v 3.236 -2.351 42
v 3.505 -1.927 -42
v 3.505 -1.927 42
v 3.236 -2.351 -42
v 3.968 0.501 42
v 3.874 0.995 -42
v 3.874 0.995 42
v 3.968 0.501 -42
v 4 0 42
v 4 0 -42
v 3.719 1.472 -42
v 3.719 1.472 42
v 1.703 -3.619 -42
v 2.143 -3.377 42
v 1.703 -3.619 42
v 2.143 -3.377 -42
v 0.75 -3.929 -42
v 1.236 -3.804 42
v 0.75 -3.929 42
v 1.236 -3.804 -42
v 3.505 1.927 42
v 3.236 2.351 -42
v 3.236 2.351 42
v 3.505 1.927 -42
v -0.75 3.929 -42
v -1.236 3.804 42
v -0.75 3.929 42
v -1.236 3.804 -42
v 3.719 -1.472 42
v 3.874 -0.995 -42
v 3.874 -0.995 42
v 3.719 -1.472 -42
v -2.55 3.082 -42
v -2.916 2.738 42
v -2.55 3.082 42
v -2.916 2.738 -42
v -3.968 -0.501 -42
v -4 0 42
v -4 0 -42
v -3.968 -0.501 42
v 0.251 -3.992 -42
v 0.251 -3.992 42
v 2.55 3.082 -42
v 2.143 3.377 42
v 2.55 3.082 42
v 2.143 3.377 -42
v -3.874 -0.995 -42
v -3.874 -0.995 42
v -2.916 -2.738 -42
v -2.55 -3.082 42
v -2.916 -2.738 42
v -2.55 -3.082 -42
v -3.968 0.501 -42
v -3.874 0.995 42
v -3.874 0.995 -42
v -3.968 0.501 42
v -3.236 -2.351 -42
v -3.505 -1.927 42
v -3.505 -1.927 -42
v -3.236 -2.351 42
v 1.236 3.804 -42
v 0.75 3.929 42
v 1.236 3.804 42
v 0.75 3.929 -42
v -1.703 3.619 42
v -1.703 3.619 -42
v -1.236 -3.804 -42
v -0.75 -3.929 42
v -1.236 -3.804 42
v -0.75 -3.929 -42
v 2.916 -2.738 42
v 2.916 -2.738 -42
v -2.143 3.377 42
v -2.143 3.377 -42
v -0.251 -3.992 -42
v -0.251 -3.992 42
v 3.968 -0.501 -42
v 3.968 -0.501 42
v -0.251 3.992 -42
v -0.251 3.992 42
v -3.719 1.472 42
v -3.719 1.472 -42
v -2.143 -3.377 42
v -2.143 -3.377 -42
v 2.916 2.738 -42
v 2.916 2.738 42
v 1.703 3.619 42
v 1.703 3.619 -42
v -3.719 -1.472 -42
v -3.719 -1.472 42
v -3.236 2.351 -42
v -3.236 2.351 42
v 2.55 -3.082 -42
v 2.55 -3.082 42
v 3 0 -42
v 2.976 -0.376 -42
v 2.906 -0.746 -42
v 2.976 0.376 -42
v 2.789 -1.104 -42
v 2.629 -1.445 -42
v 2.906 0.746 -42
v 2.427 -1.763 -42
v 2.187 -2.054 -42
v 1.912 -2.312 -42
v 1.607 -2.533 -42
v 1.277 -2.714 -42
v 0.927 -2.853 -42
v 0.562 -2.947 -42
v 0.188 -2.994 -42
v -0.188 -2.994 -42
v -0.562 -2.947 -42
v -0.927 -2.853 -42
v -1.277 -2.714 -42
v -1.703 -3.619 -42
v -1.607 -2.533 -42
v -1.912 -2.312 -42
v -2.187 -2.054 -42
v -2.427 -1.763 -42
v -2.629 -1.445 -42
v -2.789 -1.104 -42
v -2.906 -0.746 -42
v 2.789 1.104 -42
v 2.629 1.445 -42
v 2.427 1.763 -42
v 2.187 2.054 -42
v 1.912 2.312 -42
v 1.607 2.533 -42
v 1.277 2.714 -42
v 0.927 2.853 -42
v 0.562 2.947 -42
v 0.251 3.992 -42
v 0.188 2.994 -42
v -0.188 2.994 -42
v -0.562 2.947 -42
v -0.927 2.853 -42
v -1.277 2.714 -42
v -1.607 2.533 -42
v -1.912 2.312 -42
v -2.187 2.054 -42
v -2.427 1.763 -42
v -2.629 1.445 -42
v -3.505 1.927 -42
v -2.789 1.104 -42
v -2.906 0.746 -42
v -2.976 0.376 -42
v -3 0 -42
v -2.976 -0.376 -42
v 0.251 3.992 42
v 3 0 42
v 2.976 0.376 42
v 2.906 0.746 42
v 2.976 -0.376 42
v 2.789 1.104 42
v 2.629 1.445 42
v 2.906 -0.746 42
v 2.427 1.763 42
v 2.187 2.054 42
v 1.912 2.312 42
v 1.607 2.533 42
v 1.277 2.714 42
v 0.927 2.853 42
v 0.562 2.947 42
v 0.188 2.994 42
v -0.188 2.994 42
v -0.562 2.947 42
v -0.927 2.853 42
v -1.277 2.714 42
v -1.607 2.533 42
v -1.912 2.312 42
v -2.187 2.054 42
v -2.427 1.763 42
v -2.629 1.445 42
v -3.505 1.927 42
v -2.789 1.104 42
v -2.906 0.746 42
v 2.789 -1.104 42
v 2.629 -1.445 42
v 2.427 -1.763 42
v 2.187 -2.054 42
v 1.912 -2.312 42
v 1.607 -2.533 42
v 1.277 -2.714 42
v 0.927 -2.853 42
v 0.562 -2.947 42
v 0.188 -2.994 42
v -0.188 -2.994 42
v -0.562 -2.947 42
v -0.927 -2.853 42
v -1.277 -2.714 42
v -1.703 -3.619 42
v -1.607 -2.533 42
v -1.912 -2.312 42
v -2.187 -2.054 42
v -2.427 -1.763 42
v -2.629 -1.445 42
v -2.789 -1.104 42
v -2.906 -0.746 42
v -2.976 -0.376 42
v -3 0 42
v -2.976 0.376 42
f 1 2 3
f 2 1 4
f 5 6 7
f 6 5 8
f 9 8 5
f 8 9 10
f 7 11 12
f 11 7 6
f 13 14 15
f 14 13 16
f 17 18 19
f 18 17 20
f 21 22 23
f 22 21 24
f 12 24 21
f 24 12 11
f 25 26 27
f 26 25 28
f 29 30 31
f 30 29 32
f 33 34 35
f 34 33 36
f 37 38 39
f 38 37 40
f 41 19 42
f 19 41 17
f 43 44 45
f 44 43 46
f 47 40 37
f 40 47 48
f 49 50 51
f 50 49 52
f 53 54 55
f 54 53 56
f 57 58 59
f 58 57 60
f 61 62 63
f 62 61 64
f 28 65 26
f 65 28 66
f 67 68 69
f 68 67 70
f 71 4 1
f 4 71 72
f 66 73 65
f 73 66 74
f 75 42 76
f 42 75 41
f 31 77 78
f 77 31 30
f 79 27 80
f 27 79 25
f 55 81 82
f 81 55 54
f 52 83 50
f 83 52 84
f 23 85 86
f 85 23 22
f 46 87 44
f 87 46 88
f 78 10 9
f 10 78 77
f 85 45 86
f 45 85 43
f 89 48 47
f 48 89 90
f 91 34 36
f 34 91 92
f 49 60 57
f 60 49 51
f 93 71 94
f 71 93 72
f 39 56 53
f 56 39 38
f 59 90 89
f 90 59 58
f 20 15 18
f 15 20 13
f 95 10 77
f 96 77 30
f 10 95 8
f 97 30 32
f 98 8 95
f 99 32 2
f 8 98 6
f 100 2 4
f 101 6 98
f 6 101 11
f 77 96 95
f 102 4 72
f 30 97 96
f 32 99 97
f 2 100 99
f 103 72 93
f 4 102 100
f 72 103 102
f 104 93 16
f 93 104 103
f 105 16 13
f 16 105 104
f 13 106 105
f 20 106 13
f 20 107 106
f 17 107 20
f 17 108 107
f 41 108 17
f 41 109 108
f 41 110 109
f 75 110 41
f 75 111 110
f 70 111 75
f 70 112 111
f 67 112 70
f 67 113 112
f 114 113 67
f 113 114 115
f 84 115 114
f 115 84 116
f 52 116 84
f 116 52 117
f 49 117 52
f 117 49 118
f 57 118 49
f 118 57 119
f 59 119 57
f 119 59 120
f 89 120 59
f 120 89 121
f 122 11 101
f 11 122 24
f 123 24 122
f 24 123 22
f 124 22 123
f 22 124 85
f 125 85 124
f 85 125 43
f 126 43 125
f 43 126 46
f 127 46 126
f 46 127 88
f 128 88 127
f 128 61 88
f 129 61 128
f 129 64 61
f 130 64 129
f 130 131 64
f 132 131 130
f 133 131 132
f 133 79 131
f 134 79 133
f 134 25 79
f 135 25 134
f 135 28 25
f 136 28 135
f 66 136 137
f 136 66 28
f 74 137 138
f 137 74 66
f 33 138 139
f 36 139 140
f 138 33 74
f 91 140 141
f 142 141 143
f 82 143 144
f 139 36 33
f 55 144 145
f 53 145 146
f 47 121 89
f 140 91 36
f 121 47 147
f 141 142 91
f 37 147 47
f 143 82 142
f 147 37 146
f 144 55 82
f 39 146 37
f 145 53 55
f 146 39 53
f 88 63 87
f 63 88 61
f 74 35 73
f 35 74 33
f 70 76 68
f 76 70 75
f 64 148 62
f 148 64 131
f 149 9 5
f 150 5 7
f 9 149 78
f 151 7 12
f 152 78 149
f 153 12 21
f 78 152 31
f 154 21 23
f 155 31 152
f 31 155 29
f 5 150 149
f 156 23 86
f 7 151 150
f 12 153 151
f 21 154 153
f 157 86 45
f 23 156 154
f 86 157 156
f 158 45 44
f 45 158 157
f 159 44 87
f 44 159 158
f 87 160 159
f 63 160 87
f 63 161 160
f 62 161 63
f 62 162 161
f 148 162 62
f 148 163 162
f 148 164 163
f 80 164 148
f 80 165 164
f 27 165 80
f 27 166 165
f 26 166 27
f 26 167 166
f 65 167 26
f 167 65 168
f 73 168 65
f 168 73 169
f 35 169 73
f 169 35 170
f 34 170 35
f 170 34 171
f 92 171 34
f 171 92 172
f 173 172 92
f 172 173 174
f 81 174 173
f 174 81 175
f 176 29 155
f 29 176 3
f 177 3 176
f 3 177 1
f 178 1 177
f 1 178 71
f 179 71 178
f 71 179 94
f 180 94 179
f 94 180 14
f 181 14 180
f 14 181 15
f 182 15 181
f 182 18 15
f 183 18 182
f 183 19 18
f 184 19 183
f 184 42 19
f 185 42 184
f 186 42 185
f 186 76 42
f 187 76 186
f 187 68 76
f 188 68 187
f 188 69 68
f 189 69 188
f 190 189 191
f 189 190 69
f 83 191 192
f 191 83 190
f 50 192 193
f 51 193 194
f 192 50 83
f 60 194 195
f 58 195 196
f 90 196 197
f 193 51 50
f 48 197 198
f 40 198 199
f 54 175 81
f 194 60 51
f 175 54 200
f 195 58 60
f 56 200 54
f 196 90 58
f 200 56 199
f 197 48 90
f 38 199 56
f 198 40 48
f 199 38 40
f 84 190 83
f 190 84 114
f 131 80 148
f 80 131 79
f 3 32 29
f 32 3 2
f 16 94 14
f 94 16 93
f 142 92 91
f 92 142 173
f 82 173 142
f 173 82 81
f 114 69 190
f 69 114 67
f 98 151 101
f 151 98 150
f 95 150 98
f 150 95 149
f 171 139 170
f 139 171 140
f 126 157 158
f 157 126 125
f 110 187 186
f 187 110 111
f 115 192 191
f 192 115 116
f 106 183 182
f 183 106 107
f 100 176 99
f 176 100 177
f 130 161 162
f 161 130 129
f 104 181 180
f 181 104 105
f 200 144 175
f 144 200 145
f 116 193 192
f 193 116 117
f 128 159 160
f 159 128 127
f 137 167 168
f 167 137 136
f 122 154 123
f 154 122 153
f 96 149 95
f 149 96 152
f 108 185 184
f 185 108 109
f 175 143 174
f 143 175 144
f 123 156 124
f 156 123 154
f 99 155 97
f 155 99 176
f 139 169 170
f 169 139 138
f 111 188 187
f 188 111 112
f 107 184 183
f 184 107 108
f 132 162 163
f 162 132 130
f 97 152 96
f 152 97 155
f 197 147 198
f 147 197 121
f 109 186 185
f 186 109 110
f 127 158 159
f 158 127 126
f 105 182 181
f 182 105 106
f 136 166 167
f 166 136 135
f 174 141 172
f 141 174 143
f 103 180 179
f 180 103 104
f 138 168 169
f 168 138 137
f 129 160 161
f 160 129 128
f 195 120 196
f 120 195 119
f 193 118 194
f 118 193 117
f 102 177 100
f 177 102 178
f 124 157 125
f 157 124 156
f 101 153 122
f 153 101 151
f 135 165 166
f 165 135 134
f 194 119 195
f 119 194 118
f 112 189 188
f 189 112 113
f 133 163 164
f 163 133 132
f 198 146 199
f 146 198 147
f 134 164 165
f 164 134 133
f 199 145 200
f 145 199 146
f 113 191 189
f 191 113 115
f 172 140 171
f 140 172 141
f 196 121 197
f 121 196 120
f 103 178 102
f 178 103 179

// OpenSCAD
$fn = 50;


difference() {
	union() {
		translate(v = [0, 0, -42.0000000000]) {
			cylinder(h = 84, r = 4.0000000000);
		}
	}
	union() {
		translate(v = [0, 0, -100.0000000000]) {
			cylinder(h = 200, r = 3.0000000000);
		}
	}
}
